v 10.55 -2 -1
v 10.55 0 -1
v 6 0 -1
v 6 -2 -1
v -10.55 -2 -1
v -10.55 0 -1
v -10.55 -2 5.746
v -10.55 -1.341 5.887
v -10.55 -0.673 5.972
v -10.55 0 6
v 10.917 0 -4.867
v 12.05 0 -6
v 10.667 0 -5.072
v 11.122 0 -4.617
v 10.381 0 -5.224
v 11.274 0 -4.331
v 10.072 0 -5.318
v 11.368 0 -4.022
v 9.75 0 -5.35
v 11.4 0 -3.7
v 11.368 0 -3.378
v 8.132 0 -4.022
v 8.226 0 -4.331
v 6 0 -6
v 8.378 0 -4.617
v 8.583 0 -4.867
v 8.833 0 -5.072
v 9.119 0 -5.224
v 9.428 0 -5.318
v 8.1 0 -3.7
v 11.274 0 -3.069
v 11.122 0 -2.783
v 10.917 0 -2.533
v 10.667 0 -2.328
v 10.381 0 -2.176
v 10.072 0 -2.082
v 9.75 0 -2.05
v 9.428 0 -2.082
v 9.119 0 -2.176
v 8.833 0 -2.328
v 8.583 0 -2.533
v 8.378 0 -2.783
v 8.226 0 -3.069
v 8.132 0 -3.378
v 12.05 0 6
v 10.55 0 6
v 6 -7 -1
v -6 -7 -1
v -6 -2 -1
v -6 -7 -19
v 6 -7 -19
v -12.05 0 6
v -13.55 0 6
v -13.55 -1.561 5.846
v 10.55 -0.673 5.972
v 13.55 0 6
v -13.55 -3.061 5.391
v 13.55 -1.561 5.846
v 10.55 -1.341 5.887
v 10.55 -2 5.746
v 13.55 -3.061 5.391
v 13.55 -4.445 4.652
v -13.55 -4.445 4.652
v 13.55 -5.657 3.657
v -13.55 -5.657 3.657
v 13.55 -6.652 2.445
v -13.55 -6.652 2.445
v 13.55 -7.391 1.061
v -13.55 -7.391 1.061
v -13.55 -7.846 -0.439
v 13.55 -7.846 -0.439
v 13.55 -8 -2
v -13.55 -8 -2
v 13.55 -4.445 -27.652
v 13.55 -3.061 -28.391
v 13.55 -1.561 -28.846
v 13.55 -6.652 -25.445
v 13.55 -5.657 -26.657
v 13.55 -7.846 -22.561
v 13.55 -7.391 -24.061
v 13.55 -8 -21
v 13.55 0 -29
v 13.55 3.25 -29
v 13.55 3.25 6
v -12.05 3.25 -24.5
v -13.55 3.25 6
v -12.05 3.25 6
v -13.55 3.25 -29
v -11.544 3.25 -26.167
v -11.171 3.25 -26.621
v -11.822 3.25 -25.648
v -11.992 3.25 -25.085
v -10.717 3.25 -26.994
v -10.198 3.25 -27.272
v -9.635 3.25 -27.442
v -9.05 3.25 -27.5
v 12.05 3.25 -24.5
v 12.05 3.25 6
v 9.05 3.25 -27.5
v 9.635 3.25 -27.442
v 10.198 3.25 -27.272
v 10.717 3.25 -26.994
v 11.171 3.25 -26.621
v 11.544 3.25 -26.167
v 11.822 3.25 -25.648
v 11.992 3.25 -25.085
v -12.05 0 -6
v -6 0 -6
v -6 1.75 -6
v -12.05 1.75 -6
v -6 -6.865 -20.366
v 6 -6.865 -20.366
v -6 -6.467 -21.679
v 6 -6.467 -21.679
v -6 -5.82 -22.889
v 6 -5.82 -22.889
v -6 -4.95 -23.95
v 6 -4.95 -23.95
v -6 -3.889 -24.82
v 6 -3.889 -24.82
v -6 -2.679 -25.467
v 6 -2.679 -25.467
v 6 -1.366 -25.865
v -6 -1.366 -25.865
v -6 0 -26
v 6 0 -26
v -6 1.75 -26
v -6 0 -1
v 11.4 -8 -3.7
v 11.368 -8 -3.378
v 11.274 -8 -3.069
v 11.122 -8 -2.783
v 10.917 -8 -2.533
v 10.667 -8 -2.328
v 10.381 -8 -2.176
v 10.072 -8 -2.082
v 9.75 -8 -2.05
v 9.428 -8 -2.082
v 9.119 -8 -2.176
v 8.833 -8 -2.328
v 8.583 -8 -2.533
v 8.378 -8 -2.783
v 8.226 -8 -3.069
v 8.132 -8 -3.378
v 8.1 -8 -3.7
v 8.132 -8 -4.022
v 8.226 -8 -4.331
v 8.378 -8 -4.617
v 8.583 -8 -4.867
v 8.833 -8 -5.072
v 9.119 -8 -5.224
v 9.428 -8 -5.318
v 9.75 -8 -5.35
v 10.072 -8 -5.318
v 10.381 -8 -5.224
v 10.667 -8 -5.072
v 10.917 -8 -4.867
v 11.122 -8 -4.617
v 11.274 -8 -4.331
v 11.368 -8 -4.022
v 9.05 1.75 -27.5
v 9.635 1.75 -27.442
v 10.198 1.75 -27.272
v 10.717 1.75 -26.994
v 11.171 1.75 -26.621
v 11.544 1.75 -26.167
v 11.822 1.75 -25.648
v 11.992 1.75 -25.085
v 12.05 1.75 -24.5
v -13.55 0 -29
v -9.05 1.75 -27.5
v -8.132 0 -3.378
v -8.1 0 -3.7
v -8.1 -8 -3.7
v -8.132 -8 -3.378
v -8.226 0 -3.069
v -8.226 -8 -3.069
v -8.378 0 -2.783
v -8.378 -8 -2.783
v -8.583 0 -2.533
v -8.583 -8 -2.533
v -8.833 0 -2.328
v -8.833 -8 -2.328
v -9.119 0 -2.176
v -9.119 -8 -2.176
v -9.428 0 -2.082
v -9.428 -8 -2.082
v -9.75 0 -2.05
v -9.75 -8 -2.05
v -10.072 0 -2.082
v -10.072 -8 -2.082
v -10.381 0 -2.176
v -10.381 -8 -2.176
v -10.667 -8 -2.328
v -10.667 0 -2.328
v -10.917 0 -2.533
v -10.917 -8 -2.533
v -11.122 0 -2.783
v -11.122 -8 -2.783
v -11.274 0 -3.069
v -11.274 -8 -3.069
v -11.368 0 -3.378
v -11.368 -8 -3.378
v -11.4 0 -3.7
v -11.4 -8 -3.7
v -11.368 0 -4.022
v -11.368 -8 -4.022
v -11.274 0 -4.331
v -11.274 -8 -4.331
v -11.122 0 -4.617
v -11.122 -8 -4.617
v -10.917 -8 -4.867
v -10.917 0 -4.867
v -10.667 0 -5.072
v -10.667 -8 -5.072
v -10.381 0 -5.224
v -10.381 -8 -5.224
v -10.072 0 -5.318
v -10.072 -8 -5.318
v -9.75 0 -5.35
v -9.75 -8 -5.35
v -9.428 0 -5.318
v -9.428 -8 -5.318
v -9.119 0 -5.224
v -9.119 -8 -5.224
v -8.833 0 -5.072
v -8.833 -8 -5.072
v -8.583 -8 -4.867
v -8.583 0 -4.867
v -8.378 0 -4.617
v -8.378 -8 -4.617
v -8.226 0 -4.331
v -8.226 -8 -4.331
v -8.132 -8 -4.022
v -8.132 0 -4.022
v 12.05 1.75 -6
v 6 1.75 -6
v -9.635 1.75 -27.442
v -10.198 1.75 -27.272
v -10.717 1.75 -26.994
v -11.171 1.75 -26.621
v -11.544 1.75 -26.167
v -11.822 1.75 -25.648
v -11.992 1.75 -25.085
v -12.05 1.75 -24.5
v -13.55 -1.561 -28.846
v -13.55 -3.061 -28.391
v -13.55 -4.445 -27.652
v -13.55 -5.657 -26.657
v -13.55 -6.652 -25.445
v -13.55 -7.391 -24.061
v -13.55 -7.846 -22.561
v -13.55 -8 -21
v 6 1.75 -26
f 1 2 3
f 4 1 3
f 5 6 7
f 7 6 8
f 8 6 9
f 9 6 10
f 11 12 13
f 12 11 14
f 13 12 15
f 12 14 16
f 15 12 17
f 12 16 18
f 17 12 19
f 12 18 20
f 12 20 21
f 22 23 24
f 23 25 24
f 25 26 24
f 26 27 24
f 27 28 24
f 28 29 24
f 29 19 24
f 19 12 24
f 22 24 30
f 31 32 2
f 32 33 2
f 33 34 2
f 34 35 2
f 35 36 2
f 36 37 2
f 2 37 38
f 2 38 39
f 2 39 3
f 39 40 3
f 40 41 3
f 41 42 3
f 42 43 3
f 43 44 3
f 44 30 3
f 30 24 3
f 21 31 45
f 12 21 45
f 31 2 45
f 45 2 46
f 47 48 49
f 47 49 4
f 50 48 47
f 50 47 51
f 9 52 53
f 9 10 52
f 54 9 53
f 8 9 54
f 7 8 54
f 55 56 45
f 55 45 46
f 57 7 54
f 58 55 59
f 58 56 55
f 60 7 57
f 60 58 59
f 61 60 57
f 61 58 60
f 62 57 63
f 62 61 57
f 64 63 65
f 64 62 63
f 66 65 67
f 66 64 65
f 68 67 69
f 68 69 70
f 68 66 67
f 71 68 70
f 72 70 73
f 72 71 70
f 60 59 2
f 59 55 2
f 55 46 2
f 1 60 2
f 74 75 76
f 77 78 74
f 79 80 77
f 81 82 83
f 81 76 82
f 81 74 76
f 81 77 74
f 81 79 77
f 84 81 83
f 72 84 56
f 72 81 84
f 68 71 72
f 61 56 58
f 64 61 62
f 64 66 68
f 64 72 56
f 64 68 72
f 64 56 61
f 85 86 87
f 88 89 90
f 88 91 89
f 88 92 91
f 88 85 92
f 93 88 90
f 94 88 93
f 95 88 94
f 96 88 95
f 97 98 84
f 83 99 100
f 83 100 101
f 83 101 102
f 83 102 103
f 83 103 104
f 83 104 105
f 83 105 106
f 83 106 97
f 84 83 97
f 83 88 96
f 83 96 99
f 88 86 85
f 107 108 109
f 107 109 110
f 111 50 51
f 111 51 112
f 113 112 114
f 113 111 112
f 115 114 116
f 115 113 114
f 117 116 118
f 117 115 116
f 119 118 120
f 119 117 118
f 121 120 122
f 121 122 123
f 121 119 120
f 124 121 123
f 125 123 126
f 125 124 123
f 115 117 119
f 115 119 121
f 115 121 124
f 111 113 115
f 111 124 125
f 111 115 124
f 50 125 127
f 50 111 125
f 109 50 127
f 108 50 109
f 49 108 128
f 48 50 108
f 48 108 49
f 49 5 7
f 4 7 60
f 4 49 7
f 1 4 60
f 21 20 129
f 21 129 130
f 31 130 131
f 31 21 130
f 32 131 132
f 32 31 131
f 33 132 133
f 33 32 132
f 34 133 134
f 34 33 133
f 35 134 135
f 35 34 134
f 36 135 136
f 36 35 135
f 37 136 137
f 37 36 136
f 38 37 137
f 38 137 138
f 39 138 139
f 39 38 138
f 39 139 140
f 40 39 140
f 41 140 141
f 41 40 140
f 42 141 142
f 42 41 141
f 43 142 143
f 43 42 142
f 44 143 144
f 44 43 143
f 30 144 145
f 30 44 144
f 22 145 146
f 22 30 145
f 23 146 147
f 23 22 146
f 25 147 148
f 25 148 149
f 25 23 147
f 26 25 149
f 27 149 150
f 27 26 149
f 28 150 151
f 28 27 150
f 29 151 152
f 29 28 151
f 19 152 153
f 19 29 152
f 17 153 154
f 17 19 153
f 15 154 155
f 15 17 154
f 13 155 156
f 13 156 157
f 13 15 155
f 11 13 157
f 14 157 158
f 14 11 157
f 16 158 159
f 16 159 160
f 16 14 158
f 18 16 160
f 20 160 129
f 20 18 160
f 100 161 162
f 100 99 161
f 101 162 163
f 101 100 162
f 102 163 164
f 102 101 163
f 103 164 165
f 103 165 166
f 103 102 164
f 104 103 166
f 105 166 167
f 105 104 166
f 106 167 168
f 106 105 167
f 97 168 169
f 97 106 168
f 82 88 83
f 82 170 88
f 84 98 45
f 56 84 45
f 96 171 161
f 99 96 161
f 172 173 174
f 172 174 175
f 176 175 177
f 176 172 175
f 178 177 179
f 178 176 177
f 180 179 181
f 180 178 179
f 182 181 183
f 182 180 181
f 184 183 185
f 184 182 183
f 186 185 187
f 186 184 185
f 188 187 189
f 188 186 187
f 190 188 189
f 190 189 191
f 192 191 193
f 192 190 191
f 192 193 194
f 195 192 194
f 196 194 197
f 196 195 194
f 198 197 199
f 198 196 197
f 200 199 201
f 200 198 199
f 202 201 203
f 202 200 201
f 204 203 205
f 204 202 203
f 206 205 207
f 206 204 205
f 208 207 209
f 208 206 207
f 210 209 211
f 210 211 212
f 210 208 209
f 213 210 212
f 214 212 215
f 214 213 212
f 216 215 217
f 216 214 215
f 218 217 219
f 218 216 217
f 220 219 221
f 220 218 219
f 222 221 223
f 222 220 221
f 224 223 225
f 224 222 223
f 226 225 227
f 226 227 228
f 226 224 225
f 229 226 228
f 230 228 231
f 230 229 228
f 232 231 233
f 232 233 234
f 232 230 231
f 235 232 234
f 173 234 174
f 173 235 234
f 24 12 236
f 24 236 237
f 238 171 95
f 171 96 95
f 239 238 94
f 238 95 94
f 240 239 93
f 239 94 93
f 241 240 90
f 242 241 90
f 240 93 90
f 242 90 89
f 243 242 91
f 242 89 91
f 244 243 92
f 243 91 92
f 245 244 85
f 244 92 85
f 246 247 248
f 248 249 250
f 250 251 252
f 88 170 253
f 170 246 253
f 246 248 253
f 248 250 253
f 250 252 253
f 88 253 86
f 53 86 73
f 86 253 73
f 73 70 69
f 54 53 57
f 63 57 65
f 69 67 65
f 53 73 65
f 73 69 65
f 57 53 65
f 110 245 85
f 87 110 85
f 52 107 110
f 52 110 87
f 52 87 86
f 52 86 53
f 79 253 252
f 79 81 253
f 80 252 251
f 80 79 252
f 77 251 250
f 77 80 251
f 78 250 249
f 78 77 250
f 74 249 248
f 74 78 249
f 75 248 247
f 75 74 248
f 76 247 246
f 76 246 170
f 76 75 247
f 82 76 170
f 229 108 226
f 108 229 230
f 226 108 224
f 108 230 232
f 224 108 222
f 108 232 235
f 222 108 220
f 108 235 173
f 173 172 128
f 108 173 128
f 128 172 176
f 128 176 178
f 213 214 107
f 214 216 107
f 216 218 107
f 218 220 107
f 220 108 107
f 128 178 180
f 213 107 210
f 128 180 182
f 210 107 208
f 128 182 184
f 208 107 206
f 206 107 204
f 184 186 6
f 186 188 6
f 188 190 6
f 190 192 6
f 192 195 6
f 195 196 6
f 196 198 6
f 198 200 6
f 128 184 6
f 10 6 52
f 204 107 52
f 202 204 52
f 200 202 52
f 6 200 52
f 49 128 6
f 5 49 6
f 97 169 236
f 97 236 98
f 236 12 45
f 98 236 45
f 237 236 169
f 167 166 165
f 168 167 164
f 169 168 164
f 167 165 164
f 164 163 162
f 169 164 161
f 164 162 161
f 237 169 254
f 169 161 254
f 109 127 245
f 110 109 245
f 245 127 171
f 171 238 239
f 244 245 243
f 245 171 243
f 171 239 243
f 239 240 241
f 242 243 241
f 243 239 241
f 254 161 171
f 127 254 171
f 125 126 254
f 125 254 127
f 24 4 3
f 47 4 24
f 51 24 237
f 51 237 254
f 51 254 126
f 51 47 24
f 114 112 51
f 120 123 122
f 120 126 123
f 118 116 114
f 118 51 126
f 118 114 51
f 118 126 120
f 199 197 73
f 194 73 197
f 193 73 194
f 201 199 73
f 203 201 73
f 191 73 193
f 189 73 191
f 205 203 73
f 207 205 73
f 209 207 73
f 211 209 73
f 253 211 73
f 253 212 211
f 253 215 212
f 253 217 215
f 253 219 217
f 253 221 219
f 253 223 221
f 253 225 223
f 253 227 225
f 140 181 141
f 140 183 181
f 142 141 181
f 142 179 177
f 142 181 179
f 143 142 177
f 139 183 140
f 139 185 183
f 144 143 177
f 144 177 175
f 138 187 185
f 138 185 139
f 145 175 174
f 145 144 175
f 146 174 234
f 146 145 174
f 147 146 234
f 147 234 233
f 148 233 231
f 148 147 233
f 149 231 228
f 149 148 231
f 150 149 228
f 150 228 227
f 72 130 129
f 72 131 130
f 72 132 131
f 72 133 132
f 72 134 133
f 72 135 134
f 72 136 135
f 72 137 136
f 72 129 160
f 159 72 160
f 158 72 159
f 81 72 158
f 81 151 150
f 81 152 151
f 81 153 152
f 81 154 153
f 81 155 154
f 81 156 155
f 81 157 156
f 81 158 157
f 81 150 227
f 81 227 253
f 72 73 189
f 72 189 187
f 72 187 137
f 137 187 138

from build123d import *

# Parameters (mm, degrees)
SKETCH_R        = 1.65
PAD_DEPTH       = 8
SKETCH001_W     = 12
SKETCH001_H     = 7
POCKET_DEPTH    = 10
POCKET001_DEPTH = 24.101
PAD001_DEPTH    = 24.1
POCKET002_DEPTH = 12
PAD002_DEPTH    = 1.75
POCKET003_DEPTH = 2
PAD003_DEPTH    = 1.5
SKETCH009_W     = 24.1
SKETCH009_H     = 1.5
PAD004_DEPTH    = 1.5
FILLET_R        = 3


with BuildPart() as part:
    # Sketch → Pad (new body)
    with BuildSketch(Plane.XZ):
        Polygon((-12.05, 6), (-12.05, -6), (-12.05, -11), (12.05, -11), (12.05, -6), (12.05, 6), align=None)
        with Locations((-9.75, -3.7)):
            Circle(SKETCH_R, mode=Mode.SUBTRACT)
        with Locations((9.75, -3.7)):
            Circle(SKETCH_R, mode=Mode.SUBTRACT)
    extrude(amount=PAD_DEPTH)

    # Sketch001 (on Face1 of Pad) → Pocket (cut)
    with BuildSketch(Plane(origin=(0, 0, -11), x_dir=(1, 0, 0), z_dir=(0, 0, -1))):
        with Locations((0, 3.5)):
            Rectangle(SKETCH001_W, SKETCH001_H)
    extrude(amount=-POCKET_DEPTH, mode=Mode.SUBTRACT)

    # Sketch003 (on Face8 of Pocket) → Pocket001 (cut, through all)
    with BuildSketch(Plane(origin=(-12.05, 0, 0), x_dir=(0, 0, -1), z_dir=(-1, 0, 0))):
        with BuildLine():
            ThreePointArc((2, 8), (-3.656854, 5.656854), (-6, 0))
            Line((-6, 0), (-6, 8))
            Line((-6, 8), (2, 8))
        make_face()
    extrude(amount=-POCKET001_DEPTH, mode=Mode.SUBTRACT)

    # Sketch004 (on Face8 of Pocket001) → Pad001 (join)
    with BuildSketch(Plane(origin=(-12.05, 0, 0), x_dir=(0, 0, -1), z_dir=(-1, 0, 0))):
        with BuildLine():
            Line((11, 8), (21, 8))
            ThreePointArc((29, 0), (26.656854, 5.656854), (21, 8))
            Line((29, 0), (11, 0))
            Line((11, 0), (11, 8))
        make_face()
    extrude(amount=-PAD001_DEPTH)

    # Sketch005 (on Face4 of Pad001) → Pocket002 (cut)
    with BuildSketch(Plane(origin=(-6, 0, 0), x_dir=(0, 0, 1), z_dir=(1, 0, 0))):
        with BuildLine():
            Line((-11, 7), (-19, 7))
            ThreePointArc((-19, 7), (-23.949747, 4.949747), (-26, 0))
            Line((-26, 0), (-11, 0))
            Line((-11, 0), (-11, 7))
        make_face()
    extrude(amount=POCKET002_DEPTH, mode=Mode.SUBTRACT)

    # Sketch006 (on Face3 of Pocket002) → Pad002 (join)
    with BuildSketch(Plane(origin=(0, 0, 0), x_dir=(1, 0, 0), z_dir=(0, 1, 0))):
        Polygon((-12.05, 6), (-12.05, 29), (12.05, 29), (12.05, 6), (6, 6), (6, 26), (-6, 26), (-6, 6), align=None)
    extrude(amount=PAD002_DEPTH)

    # Sketch007 (on Face2 of Pad002) → Pocket003 (cut)
    with BuildSketch(Plane(origin=(0, 0, 0), x_dir=(1, 0, 0), z_dir=(0, 1, 0))):
        Polygon((-6, 1), (-10.55, 0.999989), (-10.55, -6), (10.55, -6), (10.55, 1), (6, 1), align=None)
    extrude(amount=-POCKET003_DEPTH, mode=Mode.SUBTRACT)

    # Sketch008 (on Face8 of Pocket003) → Pad003 (join)
    with BuildSketch(Plane(origin=(12.05, 0, 0), x_dir=(0, 0, 1), z_dir=(1, 0, 0))):
        with BuildLine():
            Line((-29, 0), (-29, -3.25))
            Line((-29, -3.25), (6, -3.25))
            Line((6, -3.25), (6, 0))
            ThreePointArc((6, 0), (3.656854, 5.656854), (-2, 8))
            Line((-2, 8), (-21, 8))
            ThreePointArc((-21, 8), (-26.656854, 5.656854), (-29, 0))
        make_face()
    pad003 = extrude(amount=PAD003_DEPTH)

    # Mirrored: Pad003 across YZ
    add(pad003.mirror(Plane.YZ))

    # Sketch009 (on Face11 of Mirrored) → Pad004 (join)
    with BuildSketch(Plane(origin=(0, 1.75, 0), x_dir=(1, 0, 0), z_dir=(0, 1, 0))):
        with Locations((0, 28.25)):
            Rectangle(SKETCH009_W, SKETCH009_H)
    extrude(amount=PAD004_DEPTH)

    # Fillet
    fillet_edges = [part.edges().sort_by_distance(p)[0] for p in [
        (-12.05, 2.5, -27.5),
        (12.05, 2.5, -27.5),
    ]]
    fillet(fillet_edges, radius=FILLET_R)


solid = part.part
